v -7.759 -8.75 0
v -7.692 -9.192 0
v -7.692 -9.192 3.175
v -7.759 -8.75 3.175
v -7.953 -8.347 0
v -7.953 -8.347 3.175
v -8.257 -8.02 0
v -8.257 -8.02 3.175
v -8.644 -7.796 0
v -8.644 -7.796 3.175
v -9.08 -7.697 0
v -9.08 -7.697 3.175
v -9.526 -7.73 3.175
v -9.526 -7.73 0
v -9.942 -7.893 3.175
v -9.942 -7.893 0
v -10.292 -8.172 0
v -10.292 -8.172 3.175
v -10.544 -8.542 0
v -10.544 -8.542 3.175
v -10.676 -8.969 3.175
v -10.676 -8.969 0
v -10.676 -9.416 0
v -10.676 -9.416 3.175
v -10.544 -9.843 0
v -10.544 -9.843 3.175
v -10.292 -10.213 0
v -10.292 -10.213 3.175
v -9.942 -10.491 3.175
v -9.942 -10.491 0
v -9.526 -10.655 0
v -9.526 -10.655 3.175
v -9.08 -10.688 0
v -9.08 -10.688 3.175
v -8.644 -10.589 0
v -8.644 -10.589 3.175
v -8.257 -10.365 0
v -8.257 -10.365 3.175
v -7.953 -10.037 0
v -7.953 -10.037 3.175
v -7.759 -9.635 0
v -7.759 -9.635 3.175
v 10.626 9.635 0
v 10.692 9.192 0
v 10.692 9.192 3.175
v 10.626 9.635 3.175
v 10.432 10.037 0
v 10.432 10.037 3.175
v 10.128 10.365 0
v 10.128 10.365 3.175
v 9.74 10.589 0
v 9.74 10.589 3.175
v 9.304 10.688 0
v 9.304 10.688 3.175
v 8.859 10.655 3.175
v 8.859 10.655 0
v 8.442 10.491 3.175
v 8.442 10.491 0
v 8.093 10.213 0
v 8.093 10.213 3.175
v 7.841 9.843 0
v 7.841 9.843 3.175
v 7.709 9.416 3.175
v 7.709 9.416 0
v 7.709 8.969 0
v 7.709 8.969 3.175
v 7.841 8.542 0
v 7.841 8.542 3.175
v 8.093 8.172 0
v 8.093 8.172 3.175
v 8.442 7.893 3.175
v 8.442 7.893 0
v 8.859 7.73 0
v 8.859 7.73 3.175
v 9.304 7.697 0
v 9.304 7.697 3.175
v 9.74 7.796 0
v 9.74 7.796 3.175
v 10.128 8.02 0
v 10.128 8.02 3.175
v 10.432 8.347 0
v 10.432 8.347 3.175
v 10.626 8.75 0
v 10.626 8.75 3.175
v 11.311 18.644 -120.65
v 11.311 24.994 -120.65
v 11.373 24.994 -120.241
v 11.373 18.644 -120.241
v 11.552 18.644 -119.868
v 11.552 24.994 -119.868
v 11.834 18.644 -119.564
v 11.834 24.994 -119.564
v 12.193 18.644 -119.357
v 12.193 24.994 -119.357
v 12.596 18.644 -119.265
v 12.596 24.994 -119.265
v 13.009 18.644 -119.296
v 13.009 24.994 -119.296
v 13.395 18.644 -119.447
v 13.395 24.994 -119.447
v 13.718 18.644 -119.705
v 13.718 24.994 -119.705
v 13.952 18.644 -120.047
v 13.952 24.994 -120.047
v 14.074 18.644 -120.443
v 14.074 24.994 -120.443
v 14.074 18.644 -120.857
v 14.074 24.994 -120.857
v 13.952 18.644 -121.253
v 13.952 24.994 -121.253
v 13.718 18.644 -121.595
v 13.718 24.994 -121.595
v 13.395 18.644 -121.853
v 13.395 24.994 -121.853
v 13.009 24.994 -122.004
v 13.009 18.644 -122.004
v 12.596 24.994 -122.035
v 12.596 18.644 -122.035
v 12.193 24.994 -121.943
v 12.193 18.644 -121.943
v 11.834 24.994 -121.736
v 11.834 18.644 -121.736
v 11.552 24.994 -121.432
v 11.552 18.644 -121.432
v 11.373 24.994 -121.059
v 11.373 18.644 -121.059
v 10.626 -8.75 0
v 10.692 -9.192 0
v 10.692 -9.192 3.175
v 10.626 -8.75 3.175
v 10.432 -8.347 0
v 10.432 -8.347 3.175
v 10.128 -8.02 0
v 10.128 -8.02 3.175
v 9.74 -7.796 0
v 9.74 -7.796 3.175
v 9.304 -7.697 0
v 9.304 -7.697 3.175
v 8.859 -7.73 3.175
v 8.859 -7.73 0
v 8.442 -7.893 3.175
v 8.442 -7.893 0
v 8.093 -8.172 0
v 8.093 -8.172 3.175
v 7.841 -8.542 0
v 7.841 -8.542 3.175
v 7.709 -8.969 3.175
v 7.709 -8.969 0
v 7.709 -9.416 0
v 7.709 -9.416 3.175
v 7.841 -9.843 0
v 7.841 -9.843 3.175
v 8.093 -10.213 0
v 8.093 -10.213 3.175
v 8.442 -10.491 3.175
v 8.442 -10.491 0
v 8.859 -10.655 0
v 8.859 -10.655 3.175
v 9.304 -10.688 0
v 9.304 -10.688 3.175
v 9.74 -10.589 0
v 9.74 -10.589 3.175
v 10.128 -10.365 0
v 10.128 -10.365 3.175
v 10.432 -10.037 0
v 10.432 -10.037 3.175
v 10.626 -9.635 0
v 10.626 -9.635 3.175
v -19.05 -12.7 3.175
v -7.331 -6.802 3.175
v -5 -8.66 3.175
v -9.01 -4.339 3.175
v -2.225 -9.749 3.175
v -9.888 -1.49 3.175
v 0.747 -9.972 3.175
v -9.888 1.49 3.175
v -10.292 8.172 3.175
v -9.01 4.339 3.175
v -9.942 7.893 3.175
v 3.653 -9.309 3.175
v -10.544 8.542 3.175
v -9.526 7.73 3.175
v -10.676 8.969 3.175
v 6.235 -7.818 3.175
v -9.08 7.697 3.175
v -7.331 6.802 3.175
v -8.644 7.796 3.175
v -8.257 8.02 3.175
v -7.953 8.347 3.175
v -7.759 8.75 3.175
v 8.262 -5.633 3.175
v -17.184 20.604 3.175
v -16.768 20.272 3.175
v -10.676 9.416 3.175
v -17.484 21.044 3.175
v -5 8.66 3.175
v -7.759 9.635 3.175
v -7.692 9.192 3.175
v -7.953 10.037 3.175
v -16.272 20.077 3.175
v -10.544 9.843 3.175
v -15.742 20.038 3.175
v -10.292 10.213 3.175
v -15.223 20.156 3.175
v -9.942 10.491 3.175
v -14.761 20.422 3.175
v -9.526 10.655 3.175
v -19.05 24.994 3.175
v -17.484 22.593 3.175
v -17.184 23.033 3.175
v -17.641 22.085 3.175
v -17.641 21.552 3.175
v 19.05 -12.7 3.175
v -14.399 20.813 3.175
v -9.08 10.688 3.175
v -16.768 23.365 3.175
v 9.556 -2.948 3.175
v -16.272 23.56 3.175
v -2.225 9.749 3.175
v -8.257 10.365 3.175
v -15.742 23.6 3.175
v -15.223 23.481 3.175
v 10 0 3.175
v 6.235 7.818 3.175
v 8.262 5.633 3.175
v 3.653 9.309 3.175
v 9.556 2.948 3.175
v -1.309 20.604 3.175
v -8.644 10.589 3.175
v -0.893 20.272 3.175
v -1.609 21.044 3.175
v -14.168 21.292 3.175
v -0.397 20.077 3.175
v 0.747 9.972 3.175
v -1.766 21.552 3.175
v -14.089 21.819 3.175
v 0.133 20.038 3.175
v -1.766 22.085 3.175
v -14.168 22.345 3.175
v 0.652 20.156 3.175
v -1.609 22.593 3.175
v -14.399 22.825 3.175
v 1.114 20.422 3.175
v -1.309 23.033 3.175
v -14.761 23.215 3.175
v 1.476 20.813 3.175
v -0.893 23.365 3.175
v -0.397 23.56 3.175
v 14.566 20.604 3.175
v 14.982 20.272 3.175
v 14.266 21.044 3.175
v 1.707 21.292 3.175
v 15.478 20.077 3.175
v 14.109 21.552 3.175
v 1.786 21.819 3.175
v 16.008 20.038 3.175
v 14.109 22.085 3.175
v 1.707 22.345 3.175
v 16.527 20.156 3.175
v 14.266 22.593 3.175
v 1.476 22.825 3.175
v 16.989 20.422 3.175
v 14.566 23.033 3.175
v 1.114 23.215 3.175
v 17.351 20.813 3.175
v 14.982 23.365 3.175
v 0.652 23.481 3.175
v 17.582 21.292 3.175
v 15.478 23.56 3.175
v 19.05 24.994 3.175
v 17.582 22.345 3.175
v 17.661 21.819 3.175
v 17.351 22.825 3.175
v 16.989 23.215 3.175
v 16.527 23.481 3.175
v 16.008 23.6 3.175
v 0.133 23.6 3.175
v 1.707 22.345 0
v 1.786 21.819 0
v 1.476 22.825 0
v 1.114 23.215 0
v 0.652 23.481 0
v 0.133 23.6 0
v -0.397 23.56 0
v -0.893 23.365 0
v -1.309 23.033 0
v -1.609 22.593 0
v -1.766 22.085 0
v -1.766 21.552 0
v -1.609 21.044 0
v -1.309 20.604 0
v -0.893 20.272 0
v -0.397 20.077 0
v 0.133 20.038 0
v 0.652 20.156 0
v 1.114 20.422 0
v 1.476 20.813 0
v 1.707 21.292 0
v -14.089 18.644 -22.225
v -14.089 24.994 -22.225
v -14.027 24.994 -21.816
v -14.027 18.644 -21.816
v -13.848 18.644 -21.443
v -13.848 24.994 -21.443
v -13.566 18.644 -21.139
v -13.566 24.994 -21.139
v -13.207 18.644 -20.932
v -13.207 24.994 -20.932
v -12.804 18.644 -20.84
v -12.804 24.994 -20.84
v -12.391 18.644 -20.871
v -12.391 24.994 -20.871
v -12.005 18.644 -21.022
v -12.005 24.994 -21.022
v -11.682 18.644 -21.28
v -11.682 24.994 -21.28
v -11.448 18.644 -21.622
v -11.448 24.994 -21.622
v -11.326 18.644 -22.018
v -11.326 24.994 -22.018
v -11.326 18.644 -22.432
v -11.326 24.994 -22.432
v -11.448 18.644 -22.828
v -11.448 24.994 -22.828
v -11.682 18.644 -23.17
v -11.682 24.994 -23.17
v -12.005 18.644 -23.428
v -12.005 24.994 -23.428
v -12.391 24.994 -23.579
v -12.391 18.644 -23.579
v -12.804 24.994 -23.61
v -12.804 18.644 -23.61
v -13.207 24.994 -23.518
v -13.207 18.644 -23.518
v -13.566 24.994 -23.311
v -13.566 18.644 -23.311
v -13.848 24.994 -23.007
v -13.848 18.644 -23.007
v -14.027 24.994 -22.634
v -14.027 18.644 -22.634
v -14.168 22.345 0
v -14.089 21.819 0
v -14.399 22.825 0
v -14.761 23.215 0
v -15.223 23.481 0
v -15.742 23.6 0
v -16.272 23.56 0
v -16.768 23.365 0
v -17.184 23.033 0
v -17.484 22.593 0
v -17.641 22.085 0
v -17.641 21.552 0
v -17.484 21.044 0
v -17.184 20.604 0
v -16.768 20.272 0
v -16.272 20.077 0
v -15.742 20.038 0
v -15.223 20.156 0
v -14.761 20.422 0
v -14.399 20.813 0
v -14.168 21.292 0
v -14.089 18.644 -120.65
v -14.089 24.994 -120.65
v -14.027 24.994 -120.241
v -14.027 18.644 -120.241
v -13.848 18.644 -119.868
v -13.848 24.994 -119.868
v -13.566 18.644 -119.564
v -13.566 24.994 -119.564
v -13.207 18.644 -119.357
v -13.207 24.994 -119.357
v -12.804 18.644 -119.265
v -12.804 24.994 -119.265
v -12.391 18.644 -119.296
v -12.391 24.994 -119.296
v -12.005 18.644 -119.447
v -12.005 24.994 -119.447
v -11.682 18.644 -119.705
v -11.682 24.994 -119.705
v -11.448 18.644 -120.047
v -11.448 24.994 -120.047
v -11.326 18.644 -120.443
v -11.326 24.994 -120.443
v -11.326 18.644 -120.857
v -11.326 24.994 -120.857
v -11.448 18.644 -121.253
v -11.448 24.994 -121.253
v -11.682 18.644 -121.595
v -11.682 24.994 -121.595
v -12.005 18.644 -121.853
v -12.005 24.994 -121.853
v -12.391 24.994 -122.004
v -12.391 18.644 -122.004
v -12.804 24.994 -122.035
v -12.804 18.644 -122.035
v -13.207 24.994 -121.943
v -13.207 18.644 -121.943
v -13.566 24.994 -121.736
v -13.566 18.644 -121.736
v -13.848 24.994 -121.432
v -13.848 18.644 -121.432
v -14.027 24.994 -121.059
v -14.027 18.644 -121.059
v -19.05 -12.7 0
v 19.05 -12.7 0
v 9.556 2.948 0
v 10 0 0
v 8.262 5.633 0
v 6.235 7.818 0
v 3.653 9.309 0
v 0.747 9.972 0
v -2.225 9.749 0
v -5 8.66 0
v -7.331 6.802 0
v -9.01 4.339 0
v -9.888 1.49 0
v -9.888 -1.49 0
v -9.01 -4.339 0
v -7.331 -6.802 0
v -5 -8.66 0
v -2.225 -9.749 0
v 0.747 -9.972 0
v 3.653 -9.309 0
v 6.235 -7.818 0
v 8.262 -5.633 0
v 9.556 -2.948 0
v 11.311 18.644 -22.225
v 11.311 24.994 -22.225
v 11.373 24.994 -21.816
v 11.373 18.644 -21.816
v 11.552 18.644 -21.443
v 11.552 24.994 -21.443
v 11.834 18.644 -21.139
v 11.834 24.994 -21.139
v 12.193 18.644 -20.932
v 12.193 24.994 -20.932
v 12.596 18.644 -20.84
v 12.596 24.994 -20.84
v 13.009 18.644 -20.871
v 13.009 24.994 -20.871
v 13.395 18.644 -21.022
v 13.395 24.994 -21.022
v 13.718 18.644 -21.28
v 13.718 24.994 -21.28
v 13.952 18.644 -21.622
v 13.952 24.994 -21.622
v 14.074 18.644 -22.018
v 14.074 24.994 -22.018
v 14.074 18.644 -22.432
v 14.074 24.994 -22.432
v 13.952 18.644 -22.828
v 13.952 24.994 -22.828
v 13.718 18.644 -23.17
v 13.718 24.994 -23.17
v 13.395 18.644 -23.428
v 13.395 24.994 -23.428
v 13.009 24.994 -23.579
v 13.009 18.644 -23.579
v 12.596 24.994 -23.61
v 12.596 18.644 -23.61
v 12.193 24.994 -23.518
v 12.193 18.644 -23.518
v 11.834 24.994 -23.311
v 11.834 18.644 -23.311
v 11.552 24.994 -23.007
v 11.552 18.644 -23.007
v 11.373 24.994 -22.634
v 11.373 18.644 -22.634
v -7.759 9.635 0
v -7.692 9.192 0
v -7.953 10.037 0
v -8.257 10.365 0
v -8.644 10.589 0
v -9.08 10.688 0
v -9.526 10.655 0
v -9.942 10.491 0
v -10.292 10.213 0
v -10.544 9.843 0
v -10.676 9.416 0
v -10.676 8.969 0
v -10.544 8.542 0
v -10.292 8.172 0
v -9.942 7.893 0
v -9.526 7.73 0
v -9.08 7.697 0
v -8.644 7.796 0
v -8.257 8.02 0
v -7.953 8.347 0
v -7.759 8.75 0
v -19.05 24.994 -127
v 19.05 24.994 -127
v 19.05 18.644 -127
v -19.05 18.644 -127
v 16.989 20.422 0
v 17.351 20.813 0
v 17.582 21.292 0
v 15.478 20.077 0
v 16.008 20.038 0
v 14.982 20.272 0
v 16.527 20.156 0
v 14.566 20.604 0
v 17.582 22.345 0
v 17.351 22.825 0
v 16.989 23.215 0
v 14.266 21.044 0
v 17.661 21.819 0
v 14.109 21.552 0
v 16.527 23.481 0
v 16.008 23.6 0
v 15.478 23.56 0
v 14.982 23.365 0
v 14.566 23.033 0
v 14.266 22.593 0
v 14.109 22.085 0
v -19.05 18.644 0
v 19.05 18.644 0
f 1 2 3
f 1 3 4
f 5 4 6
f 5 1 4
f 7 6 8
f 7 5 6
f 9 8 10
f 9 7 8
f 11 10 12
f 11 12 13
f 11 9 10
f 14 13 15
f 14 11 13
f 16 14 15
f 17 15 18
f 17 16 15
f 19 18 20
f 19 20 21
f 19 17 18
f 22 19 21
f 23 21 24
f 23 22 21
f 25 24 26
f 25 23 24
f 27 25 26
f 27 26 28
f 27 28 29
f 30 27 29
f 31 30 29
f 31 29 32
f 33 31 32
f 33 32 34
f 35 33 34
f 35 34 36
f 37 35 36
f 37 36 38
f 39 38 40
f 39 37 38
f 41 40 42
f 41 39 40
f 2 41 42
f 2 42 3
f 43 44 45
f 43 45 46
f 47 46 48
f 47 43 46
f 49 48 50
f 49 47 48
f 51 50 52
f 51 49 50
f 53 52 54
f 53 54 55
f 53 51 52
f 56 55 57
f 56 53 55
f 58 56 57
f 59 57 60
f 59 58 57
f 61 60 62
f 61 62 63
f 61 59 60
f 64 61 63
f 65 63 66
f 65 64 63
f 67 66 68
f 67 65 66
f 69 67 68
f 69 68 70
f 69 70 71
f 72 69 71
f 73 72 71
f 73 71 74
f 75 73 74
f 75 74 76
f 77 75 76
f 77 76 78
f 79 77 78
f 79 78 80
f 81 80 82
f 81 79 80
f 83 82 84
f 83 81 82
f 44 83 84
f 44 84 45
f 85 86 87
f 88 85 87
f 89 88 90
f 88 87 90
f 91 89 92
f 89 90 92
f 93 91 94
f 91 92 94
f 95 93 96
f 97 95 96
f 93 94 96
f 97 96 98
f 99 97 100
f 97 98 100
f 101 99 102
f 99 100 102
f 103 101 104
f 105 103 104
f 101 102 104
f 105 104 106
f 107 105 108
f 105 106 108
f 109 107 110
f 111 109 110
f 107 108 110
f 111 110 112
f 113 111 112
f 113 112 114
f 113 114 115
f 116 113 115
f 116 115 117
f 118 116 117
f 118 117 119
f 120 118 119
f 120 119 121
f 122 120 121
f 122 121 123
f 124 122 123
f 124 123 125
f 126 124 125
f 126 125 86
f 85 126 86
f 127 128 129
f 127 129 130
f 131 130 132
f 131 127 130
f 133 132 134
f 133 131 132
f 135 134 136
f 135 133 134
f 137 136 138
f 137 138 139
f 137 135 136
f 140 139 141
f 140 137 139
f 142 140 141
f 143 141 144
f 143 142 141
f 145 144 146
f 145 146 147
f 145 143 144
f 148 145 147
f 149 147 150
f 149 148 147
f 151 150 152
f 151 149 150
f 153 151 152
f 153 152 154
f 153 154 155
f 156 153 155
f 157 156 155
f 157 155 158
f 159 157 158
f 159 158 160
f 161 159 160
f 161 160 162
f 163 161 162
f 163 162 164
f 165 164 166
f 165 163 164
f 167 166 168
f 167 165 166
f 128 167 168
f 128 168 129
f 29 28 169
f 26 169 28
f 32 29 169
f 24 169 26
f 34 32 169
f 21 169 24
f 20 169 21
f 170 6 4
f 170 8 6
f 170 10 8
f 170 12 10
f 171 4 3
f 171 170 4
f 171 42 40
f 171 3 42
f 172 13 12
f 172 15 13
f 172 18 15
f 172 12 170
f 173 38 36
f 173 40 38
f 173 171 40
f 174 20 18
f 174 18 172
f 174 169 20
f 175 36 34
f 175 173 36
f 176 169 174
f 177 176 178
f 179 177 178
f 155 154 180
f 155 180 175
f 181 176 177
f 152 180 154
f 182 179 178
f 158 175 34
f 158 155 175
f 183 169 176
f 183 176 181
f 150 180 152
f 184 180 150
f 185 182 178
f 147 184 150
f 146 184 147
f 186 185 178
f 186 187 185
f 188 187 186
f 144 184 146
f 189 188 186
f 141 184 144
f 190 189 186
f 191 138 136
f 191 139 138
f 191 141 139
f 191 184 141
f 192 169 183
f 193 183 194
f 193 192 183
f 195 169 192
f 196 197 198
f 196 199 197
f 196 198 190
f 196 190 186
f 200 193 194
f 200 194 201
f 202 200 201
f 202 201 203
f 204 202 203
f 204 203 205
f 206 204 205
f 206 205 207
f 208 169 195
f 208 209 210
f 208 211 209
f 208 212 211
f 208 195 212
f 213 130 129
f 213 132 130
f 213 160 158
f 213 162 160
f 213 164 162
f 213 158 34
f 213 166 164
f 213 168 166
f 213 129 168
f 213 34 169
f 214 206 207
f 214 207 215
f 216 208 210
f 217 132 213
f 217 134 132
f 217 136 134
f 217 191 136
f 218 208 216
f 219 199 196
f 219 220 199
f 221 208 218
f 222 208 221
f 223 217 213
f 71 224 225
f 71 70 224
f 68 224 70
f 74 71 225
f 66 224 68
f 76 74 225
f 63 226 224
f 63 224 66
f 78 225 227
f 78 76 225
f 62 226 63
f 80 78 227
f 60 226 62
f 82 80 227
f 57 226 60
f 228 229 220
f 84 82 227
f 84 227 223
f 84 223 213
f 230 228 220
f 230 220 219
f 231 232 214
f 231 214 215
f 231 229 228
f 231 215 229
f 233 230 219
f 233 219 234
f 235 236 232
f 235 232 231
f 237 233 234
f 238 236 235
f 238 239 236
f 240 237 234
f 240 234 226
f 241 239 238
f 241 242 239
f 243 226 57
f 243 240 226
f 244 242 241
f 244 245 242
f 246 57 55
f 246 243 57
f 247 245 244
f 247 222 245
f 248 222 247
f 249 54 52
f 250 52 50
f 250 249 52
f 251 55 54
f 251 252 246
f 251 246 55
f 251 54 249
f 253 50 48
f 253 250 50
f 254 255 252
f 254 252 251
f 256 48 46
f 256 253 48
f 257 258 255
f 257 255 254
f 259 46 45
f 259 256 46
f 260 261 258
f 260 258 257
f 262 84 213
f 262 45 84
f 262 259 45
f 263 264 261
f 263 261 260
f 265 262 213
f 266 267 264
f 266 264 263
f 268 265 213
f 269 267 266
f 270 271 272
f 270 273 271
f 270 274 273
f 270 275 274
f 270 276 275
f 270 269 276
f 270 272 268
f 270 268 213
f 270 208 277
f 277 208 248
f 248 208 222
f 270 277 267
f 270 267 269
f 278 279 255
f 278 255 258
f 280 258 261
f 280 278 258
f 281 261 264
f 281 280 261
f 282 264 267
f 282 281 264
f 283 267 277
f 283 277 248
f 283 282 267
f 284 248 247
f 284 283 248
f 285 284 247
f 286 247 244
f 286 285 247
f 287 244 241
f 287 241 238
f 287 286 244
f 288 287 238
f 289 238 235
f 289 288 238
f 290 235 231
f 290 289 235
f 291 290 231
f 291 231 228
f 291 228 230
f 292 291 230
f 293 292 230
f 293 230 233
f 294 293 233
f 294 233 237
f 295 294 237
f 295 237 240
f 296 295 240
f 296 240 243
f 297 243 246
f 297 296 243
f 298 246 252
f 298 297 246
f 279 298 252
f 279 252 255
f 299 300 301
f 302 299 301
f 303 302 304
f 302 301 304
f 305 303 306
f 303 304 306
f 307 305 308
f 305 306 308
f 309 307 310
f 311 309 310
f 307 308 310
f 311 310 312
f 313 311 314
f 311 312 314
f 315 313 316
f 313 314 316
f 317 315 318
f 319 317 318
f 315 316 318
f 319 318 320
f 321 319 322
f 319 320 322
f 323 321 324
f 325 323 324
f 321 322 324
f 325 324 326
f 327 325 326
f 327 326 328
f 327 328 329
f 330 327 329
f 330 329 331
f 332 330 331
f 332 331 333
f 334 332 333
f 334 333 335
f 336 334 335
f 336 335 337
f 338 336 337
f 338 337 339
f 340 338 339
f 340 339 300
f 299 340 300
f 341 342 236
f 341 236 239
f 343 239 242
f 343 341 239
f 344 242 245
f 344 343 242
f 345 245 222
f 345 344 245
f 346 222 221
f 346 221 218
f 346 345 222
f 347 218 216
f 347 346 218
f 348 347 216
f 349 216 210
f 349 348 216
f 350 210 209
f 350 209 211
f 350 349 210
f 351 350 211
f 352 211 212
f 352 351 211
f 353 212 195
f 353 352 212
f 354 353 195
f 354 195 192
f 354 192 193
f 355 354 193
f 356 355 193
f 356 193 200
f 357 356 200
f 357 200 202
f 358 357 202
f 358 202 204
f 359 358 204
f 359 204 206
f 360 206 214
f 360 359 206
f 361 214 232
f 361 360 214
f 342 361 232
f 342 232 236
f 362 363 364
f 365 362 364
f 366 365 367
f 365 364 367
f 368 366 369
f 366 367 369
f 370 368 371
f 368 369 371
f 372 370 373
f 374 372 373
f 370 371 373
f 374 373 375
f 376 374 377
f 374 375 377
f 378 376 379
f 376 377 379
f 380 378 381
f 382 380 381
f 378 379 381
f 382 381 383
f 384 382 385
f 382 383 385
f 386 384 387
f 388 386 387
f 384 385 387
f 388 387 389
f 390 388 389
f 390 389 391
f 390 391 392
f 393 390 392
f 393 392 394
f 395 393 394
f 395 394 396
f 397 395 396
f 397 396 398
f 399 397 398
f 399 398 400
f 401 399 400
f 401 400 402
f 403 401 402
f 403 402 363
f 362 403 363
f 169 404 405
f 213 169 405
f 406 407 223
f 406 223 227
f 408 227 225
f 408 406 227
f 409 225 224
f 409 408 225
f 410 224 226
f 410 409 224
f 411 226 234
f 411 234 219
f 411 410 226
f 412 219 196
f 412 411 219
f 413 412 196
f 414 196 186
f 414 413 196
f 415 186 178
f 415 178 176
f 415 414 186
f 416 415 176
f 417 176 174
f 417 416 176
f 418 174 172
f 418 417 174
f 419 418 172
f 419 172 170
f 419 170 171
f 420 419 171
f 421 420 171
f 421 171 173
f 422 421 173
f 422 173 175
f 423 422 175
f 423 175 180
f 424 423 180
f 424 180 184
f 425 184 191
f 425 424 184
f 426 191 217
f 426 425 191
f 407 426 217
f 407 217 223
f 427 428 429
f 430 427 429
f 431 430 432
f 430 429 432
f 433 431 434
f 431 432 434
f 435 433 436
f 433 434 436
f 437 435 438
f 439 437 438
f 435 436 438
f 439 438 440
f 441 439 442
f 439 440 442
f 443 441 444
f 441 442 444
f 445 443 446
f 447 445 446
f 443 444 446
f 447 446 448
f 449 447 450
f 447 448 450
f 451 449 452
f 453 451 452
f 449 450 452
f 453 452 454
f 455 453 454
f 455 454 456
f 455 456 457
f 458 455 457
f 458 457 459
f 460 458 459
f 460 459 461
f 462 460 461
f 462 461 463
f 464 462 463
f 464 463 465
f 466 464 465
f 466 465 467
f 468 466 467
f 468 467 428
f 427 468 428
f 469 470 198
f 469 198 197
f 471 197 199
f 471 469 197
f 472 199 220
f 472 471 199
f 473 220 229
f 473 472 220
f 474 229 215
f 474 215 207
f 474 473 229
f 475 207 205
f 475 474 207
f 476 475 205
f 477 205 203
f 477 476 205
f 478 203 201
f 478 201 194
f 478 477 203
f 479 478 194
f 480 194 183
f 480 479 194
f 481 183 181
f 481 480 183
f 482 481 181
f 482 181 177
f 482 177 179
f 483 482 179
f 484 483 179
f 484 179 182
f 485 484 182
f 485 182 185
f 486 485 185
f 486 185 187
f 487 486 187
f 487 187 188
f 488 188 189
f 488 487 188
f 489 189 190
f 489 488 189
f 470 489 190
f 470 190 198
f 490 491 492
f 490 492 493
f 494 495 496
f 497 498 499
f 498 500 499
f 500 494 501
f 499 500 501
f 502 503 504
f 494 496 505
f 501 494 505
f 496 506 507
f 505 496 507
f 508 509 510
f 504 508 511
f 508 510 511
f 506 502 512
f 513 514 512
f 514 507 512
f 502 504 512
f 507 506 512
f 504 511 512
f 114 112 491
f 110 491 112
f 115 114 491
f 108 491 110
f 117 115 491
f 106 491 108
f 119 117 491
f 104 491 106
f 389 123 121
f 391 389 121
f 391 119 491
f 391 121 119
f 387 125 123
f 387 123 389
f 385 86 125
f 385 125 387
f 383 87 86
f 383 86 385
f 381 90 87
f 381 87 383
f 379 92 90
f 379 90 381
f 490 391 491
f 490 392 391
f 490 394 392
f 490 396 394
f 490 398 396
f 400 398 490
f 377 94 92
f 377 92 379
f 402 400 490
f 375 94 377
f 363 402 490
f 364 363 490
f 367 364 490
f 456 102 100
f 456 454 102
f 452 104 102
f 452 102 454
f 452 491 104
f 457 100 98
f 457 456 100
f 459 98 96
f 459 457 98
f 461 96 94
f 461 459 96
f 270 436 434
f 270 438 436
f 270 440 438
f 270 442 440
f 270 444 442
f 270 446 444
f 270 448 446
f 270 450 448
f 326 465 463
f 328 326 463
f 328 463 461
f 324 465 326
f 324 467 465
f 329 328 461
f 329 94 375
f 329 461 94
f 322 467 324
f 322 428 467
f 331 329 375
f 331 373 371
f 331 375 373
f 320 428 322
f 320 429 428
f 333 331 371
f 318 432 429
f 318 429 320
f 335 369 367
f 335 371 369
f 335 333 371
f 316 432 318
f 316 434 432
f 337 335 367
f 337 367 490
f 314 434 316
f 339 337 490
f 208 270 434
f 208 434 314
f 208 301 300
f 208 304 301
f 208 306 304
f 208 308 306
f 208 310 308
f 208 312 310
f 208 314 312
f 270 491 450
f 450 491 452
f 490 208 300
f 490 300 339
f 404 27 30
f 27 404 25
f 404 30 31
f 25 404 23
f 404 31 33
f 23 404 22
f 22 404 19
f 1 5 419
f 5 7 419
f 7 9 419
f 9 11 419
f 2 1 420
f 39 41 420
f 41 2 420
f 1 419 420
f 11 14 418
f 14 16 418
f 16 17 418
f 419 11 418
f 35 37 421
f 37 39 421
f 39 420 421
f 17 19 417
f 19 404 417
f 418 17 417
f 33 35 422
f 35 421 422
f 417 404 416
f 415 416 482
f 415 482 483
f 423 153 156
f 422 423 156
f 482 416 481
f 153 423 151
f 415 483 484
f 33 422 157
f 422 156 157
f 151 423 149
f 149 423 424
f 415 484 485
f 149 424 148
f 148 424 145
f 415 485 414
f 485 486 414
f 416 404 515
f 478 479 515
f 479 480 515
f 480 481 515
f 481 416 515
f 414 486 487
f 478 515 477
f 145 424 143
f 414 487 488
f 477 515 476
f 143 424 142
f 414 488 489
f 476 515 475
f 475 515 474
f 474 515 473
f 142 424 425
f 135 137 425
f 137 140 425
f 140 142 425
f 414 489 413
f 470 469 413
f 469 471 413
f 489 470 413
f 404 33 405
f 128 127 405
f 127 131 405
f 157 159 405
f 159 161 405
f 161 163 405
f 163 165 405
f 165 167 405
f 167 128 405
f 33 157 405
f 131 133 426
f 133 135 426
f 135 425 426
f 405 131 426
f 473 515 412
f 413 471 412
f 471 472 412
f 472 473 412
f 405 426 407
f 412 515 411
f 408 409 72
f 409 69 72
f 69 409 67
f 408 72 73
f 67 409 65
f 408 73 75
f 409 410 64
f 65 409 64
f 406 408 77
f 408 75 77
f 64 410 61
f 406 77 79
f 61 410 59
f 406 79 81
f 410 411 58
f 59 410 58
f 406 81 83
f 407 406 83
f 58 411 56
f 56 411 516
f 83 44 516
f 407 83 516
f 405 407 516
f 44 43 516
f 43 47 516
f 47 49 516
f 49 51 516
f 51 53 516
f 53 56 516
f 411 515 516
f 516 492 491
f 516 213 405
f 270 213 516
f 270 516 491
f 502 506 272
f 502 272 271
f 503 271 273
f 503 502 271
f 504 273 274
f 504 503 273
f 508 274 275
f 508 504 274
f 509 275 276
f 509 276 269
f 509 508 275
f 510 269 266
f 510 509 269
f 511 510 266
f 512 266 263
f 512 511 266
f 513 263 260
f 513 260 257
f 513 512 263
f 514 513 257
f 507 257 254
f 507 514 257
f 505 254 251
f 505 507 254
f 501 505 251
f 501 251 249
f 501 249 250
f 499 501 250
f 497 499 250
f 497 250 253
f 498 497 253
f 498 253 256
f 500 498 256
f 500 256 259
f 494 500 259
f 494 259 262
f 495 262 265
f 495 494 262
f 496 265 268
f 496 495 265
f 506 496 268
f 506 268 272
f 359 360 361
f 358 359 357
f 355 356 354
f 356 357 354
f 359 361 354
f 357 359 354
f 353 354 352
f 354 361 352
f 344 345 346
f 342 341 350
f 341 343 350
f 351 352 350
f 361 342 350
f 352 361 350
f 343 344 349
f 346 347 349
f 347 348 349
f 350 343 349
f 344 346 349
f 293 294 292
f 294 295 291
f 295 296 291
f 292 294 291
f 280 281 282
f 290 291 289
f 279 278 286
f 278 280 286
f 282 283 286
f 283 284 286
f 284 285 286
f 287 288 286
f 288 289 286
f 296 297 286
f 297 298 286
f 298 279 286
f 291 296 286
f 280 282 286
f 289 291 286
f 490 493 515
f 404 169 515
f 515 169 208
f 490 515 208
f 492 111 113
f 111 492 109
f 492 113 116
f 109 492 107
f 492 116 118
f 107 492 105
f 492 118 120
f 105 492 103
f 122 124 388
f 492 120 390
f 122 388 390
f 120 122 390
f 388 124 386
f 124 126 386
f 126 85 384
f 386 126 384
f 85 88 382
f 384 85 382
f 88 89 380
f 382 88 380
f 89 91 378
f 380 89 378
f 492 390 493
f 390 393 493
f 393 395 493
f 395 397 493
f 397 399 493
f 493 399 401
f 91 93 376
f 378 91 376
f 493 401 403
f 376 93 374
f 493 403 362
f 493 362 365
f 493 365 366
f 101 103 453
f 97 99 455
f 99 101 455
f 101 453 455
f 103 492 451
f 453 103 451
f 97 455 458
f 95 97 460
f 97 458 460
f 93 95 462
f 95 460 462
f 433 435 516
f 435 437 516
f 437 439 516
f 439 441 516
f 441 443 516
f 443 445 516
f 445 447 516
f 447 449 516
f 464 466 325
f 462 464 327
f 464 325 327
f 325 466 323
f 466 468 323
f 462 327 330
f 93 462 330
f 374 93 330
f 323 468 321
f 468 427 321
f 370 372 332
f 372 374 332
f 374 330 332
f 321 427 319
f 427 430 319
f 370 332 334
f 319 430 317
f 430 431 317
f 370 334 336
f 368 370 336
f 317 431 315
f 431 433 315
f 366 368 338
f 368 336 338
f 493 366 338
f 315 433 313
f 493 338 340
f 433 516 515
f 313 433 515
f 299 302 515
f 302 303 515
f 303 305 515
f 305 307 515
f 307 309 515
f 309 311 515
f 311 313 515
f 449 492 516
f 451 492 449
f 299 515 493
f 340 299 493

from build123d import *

# Parameters (mm, degrees)
SKETCH1_W           = 38.1
SKETCH1_H           = 37.6936
SKETCH1_R           = 10
SKETCH1_R_2         = 1.5
SKETCH1_R_3         = 1.7859375
BOSS_EXTRUDE1_DEPTH = 3.175
SKETCH2_W           = 38.1
SKETCH2_H           = 6.35
BOSS_EXTRUDE2_DEPTH = 127
CUT_EXTRUDE1_REACH  = 135.838
SKETCH3_R           = 1.3890625


with BuildPart() as part:
    # Sketch1 → Boss-Extrude1 (new body)
    with BuildSketch(Plane.XY):
        with Locations((0, 6.1468)):
            Rectangle(SKETCH1_W, SKETCH1_H)
        Circle(SKETCH1_R, mode=Mode.SUBTRACT)
        with Locations((-9.192388155, 9.192388155)):
            Circle(SKETCH1_R_2, mode=Mode.SUBTRACT)
        with Locations((9.192388155, 9.192388155)):
            Circle(SKETCH1_R_2, mode=Mode.SUBTRACT)
        with Locations((9.192388155, -9.192388155)):
            Circle(SKETCH1_R_2, mode=Mode.SUBTRACT)
        with Locations((-9.192388155, -9.192388155)):
            Circle(SKETCH1_R_2, mode=Mode.SUBTRACT)
        with Locations((15.875, 21.8186)):
            Circle(SKETCH1_R_3, mode=Mode.SUBTRACT)
        with Locations((0, 21.8186)):
            Circle(SKETCH1_R_3, mode=Mode.SUBTRACT)
        with Locations((-15.875, 21.8186)):
            Circle(SKETCH1_R_3, mode=Mode.SUBTRACT)
    extrude(amount=BOSS_EXTRUDE1_DEPTH)

    # Sketch2 → Boss-Extrude2 (add)
    with BuildSketch(Plane(origin=(0, 0, 0), x_dir=(-1, 0, 0), z_dir=(0, 0, -1))):
        with Locations((0, 21.8186)):
            Rectangle(SKETCH2_W, SKETCH2_H)
    extrude(amount=BOSS_EXTRUDE2_DEPTH)

    # Sketch3 → Cut-Extrude1 (cut, up to next)
    with BuildSketch(Plane(origin=(0, 24.9936, 0), x_dir=(1, 0, 0), z_dir=(0, 1, 0)), mode=Mode.PRIVATE) as cut_extrude1_sk1:
        with Locations(Location((-12.7, 120.65, 0), (0, 0, 180))):
            Circle(SKETCH3_R)
    cut_extrude1_tool1 = extrude(cut_extrude1_sk1.sketch, amount=-CUT_EXTRUDE1_REACH, mode=Mode.PRIVATE) & part.part
    # Sketch3 → Cut-Extrude1 (cut, up to next)
    with BuildSketch(Plane(origin=(0, 24.9936, 0), x_dir=(1, 0, 0), z_dir=(0, 1, 0)), mode=Mode.PRIVATE) as cut_extrude1_sk2:
        with Locations(Location((12.7, 120.65, 0), (0, 0, 180))):
            Circle(SKETCH3_R)
    cut_extrude1_tool2 = extrude(cut_extrude1_sk2.sketch, amount=-CUT_EXTRUDE1_REACH, mode=Mode.PRIVATE) & part.part
    # Sketch3 → Cut-Extrude1 (cut, up to next)
    with BuildSketch(Plane(origin=(0, 24.9936, 0), x_dir=(1, 0, 0), z_dir=(0, 1, 0)), mode=Mode.PRIVATE) as cut_extrude1_sk3:
        with Locations(Location((-12.7, 22.225, 0), (0, 0, 180))):
            Circle(SKETCH3_R)
    cut_extrude1_tool3 = extrude(cut_extrude1_sk3.sketch, amount=-CUT_EXTRUDE1_REACH, mode=Mode.PRIVATE) & part.part
    # Sketch3 → Cut-Extrude1 (cut, up to next)
    with BuildSketch(Plane(origin=(0, 24.9936, 0), x_dir=(1, 0, 0), z_dir=(0, 1, 0)), mode=Mode.PRIVATE) as cut_extrude1_sk4:
        with Locations(Location((12.7, 22.225, 0), (0, 0, 180))):
            Circle(SKETCH3_R)
    cut_extrude1_tool4 = extrude(cut_extrude1_sk4.sketch, amount=-CUT_EXTRUDE1_REACH, mode=Mode.PRIVATE) & part.part
    add(cut_extrude1_tool1.solids().sort_by_distance((-12.7, 24.9936, -120.65))[0], mode=Mode.SUBTRACT)
    add(cut_extrude1_tool2.solids().sort_by_distance((12.7, 24.9936, -120.65))[0], mode=Mode.SUBTRACT)
    add(cut_extrude1_tool3.solids().sort_by_distance((-12.7, 24.9936, -22.225))[0], mode=Mode.SUBTRACT)
    add(cut_extrude1_tool4.solids().sort_by_distance((12.7, 24.9936, -22.225))[0], mode=Mode.SUBTRACT)


solid = part.part
